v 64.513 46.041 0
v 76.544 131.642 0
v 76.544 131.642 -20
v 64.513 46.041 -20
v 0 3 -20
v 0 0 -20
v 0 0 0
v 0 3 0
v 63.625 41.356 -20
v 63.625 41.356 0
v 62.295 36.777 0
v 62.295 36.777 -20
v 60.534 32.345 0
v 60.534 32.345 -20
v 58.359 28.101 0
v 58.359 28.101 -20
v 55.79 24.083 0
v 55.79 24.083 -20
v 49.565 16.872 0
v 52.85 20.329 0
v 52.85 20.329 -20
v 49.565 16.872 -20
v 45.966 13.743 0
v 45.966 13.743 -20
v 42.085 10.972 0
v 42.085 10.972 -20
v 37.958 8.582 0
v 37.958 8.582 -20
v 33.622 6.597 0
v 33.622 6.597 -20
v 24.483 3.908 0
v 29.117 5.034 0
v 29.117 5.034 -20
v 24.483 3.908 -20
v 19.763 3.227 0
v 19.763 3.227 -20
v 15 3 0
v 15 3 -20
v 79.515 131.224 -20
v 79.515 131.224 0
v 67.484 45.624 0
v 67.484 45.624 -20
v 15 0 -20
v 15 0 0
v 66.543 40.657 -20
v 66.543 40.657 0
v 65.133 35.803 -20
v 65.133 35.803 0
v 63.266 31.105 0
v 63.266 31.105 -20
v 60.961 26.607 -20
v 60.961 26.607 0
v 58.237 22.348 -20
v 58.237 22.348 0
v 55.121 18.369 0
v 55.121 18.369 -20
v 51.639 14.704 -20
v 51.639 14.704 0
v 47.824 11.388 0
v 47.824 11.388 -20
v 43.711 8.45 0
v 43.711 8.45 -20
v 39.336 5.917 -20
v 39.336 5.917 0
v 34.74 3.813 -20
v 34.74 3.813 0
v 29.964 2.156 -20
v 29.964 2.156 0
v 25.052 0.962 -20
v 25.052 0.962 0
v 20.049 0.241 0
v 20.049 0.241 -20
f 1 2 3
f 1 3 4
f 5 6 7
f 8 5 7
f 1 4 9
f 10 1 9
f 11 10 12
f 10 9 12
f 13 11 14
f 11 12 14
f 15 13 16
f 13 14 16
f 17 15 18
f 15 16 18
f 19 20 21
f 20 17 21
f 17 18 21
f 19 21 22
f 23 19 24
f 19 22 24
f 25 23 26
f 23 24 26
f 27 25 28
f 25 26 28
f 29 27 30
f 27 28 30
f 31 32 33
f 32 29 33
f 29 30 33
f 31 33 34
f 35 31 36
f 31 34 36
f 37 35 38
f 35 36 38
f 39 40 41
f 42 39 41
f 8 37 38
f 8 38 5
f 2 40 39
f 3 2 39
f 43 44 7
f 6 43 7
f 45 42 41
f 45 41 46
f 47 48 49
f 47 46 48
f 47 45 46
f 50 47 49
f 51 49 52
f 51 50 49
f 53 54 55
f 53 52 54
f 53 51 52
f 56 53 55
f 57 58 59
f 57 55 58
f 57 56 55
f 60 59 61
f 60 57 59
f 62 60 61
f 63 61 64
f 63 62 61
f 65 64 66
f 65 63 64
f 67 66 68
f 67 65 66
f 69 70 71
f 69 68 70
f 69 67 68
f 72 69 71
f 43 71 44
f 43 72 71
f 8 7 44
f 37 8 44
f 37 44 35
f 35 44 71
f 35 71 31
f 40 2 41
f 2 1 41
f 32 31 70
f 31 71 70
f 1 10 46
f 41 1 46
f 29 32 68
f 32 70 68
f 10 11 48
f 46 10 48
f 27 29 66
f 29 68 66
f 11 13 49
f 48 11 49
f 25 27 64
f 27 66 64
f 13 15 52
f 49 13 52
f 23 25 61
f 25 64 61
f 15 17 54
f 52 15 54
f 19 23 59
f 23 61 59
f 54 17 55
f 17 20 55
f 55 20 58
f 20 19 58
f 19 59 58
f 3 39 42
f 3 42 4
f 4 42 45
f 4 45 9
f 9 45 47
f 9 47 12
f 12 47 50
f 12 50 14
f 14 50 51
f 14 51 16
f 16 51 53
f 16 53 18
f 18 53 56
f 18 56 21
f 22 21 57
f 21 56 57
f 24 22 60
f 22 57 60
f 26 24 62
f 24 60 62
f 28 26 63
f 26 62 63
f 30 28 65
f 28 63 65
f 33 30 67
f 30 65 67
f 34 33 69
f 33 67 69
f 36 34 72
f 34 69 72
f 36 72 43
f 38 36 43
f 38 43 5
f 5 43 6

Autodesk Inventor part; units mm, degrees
ref_plane "YZ Plane" through (0, 0, 0) normal (1, 0, 0) x (0, 1, 0)
ref_plane "XZ Plane" through (0, 0, 0) normal (0, 1, 0) x (-1, 0, 0)
ref_plane "XY Plane" through (0, 0, 0) normal (0, 0, 1) x (1, 0, 0)
sketch "Sketch2" plane through (0, 0, 0) normal (0, 1, 0) x (-1, 0, 0)
  line L0 (0, 0) -> (-173, 0)
  line L1 (-173, 0) -> (-173, -20)
  line L2 (-173, -20) -> (0, -20)
  line L3 (0, -20) -> (0, 0)
  dimension "d0" = 173
  dimension "d1" = 20
extrude "Extrusion1" add sketch "Sketch2" along normal blind 3
sketch "Sketch3" plane through (0, 3, 0) normal (0, 1, 0) x (1, 0, 0)
  line L0 (173, 20) -> (0, 20) projected
  line L1 (173, 0) -> (173, 20) projected
  line L2 (173, 20) -> (173, 0)
  line L3 (15, 20) -> (15, 0)
  line L4 (0, 0) -> (173, 0) projected
  line L5 (0, 20) -> (0, 0) projected
  dimension "d8" = 15
bend part "Bend Part1" radius 50 angle 82 line through (15, 3, -20) along (0, 0, 1) centre toward (0, 1, 0) moving side (1, 0, 0) both sides no
properties part number "ball-reload-left"
